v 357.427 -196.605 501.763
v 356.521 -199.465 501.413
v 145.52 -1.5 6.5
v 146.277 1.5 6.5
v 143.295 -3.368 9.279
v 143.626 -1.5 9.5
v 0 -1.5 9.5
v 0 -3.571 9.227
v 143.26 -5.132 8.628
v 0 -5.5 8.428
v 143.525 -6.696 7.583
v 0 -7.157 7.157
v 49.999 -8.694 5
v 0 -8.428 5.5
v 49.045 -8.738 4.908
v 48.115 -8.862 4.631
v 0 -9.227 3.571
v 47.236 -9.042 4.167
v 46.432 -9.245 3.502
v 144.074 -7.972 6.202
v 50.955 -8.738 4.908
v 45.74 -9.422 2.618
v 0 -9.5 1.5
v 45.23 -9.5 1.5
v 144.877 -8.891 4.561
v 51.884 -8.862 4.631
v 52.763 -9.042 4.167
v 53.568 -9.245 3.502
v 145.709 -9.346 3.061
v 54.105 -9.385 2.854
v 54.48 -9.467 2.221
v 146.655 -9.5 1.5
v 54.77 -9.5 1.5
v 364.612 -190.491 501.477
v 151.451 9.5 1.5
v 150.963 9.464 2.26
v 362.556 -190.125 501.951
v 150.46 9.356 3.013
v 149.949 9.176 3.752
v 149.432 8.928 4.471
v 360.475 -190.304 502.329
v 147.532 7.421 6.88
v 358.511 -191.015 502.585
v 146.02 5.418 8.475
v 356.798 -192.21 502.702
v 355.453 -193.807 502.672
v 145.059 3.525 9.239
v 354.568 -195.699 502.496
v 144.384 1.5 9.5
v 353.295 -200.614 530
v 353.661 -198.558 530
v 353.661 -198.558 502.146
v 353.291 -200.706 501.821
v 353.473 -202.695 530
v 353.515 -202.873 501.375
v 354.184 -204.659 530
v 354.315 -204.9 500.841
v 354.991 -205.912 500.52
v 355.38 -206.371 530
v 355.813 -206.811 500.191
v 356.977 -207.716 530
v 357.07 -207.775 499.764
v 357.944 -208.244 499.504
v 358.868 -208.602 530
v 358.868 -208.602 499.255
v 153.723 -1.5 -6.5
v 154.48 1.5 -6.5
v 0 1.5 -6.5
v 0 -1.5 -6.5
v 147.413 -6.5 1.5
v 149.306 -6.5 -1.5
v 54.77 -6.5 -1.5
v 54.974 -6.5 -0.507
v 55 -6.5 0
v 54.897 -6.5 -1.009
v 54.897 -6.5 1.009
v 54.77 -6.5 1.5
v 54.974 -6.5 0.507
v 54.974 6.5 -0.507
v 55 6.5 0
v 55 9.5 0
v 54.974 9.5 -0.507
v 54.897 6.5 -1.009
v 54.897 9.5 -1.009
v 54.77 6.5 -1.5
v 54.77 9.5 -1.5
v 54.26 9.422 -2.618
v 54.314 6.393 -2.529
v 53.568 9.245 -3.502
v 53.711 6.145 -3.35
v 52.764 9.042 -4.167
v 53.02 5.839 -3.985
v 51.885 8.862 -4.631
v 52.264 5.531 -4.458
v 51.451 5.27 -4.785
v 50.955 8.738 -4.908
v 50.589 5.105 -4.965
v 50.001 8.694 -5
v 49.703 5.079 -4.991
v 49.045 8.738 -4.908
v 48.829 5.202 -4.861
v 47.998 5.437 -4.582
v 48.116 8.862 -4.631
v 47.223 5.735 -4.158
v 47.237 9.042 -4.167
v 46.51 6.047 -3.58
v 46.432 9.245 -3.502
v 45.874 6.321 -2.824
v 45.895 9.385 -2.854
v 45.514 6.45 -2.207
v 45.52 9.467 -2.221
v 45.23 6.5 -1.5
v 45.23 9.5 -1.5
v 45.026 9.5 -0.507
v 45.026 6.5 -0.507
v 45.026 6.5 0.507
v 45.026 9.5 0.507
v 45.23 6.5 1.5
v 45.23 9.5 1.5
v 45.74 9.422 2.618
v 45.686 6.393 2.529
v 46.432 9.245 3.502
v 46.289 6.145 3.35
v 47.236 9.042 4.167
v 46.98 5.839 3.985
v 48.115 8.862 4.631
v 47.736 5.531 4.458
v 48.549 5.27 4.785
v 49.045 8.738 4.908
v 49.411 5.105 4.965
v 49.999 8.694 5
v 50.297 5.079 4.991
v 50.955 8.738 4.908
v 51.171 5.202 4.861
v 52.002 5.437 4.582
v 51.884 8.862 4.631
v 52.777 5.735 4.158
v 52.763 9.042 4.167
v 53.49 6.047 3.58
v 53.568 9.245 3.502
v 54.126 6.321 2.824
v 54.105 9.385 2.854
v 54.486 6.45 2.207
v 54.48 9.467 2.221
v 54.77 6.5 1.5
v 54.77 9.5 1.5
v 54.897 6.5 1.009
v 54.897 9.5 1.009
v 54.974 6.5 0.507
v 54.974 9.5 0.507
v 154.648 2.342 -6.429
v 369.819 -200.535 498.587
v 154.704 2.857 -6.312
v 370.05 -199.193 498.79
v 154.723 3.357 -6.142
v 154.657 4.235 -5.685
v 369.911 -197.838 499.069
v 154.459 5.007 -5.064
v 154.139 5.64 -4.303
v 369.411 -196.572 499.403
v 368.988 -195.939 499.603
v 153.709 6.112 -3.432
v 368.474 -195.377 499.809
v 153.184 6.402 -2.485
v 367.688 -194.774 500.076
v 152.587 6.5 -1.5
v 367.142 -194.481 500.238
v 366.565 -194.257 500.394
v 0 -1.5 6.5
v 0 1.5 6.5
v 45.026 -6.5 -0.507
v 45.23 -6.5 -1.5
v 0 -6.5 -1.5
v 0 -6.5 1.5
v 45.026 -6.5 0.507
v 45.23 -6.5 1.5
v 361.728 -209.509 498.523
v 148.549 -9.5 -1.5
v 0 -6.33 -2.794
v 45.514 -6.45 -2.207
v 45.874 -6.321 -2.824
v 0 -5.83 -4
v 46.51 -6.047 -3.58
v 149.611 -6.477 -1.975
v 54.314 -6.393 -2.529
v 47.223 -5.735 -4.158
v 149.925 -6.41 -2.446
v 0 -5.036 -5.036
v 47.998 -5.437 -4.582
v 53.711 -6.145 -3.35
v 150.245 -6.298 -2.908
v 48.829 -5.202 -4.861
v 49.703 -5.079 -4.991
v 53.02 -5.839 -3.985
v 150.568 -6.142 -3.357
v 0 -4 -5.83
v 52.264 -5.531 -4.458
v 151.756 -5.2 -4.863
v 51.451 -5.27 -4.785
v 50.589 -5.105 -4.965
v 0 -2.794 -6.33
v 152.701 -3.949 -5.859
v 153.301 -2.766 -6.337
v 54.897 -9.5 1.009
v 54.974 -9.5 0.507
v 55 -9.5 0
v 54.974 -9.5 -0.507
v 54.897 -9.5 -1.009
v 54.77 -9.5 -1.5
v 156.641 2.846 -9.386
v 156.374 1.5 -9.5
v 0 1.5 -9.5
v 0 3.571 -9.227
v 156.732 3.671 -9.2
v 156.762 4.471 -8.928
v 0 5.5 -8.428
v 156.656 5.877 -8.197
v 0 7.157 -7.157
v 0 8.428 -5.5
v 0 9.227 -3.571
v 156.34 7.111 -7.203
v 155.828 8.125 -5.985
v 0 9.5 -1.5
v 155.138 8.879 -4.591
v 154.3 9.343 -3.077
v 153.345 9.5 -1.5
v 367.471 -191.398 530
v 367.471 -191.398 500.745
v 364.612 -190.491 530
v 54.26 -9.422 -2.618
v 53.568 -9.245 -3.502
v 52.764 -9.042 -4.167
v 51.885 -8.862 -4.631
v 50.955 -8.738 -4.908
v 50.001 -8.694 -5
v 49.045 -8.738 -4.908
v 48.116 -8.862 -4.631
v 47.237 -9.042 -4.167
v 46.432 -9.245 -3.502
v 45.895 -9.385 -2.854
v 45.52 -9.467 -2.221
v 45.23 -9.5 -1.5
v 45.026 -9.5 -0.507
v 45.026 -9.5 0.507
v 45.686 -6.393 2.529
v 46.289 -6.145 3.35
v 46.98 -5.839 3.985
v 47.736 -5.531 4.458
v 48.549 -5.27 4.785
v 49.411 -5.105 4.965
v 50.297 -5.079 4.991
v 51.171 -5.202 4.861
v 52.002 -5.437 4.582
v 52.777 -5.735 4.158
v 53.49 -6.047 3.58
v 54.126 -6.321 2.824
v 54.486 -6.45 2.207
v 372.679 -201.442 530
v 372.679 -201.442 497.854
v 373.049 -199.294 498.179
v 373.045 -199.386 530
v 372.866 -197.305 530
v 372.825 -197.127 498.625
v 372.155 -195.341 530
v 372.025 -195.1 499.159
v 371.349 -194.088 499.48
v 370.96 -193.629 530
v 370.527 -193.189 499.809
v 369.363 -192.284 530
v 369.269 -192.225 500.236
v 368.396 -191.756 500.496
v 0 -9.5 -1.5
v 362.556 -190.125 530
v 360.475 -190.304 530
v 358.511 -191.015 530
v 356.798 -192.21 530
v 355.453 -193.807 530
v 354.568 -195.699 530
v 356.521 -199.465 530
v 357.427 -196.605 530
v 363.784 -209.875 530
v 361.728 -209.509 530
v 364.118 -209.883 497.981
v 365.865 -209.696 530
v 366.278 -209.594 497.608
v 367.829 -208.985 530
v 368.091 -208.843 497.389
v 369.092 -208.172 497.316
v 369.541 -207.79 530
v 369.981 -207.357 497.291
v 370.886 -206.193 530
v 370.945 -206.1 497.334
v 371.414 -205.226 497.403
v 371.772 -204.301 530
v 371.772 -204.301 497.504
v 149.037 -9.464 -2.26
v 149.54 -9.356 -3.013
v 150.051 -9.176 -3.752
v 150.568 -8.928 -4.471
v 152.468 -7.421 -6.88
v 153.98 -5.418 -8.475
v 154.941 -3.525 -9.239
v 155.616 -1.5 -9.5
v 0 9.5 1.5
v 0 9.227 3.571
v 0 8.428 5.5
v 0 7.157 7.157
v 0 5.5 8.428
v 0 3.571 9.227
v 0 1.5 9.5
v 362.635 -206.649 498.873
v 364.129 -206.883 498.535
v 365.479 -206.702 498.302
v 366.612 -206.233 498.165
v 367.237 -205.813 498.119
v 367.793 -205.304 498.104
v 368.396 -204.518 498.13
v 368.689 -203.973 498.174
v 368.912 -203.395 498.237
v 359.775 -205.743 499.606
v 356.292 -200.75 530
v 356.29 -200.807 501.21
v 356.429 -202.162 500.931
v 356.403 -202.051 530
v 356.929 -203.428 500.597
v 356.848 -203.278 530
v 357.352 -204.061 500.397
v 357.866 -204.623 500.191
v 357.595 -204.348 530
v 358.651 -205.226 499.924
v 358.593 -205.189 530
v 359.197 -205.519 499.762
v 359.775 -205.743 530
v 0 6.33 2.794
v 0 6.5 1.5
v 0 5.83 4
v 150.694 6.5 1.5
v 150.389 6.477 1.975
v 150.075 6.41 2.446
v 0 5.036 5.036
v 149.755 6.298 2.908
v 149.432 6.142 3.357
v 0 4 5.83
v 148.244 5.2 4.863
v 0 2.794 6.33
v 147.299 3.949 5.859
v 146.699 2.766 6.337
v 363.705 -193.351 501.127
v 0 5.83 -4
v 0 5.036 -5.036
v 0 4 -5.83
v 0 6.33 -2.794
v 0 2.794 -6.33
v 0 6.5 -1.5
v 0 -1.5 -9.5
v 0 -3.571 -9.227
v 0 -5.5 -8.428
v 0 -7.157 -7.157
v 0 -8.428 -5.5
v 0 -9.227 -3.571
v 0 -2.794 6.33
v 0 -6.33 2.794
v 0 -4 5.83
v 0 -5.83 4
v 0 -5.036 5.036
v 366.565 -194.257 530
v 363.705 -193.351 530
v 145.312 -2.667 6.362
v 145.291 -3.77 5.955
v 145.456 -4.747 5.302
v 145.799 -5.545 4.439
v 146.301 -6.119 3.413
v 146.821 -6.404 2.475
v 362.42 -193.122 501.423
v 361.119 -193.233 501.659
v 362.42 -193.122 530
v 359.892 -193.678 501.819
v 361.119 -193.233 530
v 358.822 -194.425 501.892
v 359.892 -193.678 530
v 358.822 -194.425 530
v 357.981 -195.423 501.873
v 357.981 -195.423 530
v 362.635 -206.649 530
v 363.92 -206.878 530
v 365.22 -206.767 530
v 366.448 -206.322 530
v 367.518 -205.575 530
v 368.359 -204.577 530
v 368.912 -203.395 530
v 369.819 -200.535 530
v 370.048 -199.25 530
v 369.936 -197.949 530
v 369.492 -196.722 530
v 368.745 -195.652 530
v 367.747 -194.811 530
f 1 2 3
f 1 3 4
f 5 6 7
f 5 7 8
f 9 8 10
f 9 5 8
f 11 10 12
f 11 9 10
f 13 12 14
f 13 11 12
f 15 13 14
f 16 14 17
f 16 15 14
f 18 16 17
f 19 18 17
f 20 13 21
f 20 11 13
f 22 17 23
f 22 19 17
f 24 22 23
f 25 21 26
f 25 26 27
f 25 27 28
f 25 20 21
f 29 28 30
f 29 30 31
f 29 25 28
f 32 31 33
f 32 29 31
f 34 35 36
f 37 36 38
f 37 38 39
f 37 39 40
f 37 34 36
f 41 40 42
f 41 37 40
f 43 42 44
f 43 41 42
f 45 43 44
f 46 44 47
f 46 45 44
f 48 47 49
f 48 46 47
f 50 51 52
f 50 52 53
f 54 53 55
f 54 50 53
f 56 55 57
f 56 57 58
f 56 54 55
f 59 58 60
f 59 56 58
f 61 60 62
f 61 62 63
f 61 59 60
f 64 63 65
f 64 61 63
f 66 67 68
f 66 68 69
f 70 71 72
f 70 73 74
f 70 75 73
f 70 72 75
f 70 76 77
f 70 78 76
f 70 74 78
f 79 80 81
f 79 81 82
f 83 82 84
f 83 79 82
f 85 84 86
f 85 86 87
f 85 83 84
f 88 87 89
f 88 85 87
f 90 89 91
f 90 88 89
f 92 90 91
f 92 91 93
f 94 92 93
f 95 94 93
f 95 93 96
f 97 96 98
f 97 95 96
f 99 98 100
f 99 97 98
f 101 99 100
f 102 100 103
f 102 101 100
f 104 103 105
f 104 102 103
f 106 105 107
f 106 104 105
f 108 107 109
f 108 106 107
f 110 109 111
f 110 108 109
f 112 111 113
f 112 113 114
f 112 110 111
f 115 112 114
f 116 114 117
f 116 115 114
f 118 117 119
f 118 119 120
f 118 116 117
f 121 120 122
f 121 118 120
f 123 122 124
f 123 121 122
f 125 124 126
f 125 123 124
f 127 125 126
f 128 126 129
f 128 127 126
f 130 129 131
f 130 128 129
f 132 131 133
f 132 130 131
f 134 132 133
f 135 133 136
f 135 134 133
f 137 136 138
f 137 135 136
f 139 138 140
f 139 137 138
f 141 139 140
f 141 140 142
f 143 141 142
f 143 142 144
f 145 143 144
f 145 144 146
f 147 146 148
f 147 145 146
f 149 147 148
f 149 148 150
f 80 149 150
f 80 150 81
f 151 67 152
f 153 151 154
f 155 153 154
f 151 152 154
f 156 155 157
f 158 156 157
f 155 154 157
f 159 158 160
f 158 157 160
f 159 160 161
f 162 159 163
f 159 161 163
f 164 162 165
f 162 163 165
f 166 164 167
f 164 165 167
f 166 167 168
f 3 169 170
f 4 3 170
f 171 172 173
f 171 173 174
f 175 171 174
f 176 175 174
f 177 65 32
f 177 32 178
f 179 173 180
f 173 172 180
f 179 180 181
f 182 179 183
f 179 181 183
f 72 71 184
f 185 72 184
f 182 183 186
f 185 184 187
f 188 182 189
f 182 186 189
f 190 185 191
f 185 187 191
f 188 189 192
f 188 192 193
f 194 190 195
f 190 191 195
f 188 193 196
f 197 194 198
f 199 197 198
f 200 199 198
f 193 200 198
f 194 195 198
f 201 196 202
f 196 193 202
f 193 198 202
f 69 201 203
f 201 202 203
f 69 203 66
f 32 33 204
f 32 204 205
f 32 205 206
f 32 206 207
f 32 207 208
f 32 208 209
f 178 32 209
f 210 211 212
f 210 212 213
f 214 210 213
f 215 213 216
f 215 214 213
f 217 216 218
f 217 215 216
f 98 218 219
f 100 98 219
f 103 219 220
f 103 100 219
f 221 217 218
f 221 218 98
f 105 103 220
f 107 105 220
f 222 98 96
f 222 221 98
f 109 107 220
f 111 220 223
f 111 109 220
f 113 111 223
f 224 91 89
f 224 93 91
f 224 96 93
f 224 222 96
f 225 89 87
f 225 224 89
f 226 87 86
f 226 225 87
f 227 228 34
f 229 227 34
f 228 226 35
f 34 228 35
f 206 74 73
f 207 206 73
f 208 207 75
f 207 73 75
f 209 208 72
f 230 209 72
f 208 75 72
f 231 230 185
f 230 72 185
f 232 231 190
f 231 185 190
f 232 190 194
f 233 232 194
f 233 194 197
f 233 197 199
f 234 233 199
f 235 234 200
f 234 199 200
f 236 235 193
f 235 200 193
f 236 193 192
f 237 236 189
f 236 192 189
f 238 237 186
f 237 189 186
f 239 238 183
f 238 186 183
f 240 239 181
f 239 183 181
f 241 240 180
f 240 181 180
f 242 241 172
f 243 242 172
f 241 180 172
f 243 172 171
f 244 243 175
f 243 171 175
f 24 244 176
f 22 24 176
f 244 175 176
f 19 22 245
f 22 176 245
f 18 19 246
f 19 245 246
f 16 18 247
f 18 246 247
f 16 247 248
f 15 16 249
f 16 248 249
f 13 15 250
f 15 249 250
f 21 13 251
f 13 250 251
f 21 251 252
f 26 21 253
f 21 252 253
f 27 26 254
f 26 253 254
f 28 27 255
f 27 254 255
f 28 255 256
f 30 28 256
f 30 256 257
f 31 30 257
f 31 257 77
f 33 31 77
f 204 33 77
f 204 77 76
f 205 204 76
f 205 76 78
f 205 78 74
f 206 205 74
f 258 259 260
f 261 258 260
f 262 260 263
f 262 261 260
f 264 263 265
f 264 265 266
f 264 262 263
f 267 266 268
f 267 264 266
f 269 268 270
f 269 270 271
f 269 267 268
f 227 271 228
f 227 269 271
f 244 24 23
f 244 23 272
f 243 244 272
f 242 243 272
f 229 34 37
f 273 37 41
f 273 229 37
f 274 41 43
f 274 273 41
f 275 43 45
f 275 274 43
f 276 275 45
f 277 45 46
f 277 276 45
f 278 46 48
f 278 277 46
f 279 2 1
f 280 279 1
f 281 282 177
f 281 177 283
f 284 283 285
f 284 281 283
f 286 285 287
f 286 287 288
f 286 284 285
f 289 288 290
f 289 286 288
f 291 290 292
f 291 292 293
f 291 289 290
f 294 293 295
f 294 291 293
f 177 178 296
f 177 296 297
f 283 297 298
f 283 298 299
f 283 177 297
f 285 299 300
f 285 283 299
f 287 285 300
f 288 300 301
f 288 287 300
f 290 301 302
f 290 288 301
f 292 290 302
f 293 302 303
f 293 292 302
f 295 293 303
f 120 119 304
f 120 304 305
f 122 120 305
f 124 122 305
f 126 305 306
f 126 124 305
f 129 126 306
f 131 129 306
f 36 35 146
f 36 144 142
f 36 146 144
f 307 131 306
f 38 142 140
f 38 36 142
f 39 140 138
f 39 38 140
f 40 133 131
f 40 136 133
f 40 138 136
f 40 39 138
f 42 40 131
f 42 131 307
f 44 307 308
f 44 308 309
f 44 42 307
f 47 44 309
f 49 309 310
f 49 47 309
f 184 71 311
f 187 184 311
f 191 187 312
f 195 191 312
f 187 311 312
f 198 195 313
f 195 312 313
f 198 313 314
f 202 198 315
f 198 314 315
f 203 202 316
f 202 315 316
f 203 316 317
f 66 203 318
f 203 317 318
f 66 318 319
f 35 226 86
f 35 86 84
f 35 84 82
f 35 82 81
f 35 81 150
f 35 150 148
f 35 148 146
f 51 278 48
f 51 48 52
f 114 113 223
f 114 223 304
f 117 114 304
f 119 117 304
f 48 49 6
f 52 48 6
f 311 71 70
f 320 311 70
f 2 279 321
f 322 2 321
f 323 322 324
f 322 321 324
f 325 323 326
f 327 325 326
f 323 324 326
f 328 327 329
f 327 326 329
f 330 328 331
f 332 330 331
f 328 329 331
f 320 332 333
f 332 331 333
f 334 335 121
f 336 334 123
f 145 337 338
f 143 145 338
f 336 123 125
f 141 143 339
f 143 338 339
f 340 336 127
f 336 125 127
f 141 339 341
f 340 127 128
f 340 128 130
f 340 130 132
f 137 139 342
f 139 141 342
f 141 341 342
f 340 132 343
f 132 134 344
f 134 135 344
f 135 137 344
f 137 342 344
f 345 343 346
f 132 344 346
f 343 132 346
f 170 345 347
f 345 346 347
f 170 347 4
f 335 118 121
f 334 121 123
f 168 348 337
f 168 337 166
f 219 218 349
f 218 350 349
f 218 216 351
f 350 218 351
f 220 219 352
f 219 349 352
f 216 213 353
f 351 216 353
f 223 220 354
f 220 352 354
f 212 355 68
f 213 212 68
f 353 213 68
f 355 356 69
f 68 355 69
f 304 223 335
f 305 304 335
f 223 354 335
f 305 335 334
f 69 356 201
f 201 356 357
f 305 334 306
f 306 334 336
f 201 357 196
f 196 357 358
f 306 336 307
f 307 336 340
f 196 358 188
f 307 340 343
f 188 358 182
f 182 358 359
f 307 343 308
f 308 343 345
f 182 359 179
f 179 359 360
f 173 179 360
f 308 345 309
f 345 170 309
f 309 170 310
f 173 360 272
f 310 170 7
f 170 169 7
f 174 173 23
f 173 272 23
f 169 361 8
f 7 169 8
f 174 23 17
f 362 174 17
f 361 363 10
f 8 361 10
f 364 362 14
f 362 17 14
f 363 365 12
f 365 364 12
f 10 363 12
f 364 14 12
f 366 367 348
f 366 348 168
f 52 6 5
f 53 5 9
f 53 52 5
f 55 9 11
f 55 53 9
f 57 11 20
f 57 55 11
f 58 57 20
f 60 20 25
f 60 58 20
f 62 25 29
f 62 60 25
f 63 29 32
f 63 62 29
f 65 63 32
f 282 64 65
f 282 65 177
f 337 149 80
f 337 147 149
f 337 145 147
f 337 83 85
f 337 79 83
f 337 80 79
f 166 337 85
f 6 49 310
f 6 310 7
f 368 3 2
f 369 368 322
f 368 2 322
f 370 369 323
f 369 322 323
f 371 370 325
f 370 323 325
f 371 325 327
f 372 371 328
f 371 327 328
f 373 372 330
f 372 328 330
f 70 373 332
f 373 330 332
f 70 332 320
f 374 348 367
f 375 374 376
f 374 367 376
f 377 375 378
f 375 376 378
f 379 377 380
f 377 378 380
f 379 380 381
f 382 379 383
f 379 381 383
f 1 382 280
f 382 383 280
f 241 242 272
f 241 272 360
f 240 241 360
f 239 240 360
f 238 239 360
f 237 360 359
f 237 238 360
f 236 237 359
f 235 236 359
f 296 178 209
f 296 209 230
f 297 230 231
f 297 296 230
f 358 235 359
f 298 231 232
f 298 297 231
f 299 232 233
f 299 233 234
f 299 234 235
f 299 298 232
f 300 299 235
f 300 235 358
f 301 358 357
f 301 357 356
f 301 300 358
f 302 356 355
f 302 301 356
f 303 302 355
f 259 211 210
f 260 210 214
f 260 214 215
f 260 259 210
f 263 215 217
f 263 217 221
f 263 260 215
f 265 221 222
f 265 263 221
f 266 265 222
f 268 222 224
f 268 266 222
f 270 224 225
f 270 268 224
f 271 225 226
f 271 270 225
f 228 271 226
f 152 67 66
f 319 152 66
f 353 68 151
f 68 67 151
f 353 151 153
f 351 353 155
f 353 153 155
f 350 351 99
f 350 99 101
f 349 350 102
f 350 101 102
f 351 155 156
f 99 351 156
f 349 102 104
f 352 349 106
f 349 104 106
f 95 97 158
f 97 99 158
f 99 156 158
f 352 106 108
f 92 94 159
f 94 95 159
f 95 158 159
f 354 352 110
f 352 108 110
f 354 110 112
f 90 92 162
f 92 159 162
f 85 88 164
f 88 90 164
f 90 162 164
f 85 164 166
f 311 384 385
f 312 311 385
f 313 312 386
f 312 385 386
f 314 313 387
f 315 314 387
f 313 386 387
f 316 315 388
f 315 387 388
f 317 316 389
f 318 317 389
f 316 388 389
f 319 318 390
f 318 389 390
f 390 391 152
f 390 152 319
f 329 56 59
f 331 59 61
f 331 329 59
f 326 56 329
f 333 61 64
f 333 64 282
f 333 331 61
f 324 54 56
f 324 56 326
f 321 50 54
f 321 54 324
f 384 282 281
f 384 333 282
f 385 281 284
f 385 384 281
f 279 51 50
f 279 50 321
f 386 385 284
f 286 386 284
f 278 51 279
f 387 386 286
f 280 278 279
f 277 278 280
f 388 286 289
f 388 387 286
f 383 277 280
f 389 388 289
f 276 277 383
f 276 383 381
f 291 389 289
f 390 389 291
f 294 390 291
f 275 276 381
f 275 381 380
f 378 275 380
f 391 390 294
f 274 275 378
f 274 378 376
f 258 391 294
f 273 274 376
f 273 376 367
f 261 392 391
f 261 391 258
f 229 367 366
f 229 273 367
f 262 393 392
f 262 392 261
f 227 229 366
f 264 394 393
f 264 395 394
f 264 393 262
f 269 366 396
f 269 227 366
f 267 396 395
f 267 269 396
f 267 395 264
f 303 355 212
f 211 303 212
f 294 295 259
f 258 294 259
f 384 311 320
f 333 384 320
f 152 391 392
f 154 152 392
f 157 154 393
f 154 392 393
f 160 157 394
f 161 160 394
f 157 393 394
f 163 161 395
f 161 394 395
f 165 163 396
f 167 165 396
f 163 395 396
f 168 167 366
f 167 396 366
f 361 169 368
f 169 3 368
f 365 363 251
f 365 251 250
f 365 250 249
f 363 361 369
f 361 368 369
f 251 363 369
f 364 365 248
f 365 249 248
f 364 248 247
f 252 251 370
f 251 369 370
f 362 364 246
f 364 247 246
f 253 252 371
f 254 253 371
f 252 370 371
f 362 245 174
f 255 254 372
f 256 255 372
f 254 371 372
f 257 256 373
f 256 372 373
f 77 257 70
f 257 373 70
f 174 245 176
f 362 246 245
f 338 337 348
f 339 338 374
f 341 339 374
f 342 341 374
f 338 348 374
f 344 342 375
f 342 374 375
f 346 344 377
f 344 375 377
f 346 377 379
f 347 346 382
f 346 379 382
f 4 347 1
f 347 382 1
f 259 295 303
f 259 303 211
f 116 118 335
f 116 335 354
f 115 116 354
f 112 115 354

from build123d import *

# Parameters (mm, degrees)
SKETCH21_R              = 5
CUT_EXTRUDE3_DEPTH      = 10.5
CUT_EXTRUDE3_DEPTH_BACK = 210.883244548


with BuildPart() as part:
    # Sweep-Thin3: sweep along a curve in space
    with BuildLine() as sweep_thin3_path:
        Line((0, 0, 0), (150, 0, 0))
        Line((150, 0, 0), (363.169892788, -200, 500))
        Line((363.169892788, -200, 500), (363.169892788, -200, 530))
    # Sketch2 → Sweep-Thin3 (sweep)
    with BuildSketch(Plane(origin=(0, 0, 0), x_dir=(0, 0, -1), z_dir=(1, 0, 0))):
        with BuildLine():
            Line((1.5, 9.5), (-1.5, 9.5))
            ThreePointArc((-1.5, 9.5), (-7.156854249, 7.156854249), (-9.5, 1.5))
            Line((-9.5, 1.5), (-9.5, -1.5))
            ThreePointArc((-9.5, -1.5), (-7.156854249, -7.156854249), (-1.5, -9.5))
            Line((-1.5, -9.5), (1.5, -9.5))
            ThreePointArc((1.5, -9.5), (7.156854249, -7.156854249), (9.5, -1.5))
            Line((9.5, -1.5), (9.5, 1.5))
            ThreePointArc((9.5, 1.5), (7.156854249, 7.156854249), (1.5, 9.5))
        make_face()
        with BuildLine():
            Line((1.5, 6.5), (-1.5, 6.5))
            ThreePointArc((-1.5, 6.5), (-5.035533906, 5.035533906), (-6.5, 1.5))
            Line((-6.5, 1.5), (-6.5, -1.5))
            ThreePointArc((-6.5, -1.5), (-5.035533906, -5.035533906), (-1.5, -6.5))
            Line((-1.5, -6.5), (1.5, -6.5))
            ThreePointArc((1.5, -6.5), (5.035533906, -5.035533906), (6.5, -1.5))
            Line((6.5, -1.5), (6.5, 1.5))
            ThreePointArc((6.5, 1.5), (5.035533906, 5.035533906), (1.5, 6.5))
        make_face(mode=Mode.SUBTRACT)
    sweep(path=sweep_thin3_path.line, transition=Transition.RIGHT)

    # Sketch21 → Cut-Extrude3 (cut, two sides)
    with BuildSketch(Plane(origin=(0, 0, 0), x_dir=(1, 0, 0), z_dir=(0, 1, 0))) as cut_extrude3_sk:
        with Locations((50, 0)):
            Circle(SKETCH21_R)
    extrude(amount=CUT_EXTRUDE3_DEPTH, mode=Mode.SUBTRACT)
    extrude(cut_extrude3_sk.sketch, amount=-CUT_EXTRUDE3_DEPTH_BACK, mode=Mode.SUBTRACT)


solid = part.part
